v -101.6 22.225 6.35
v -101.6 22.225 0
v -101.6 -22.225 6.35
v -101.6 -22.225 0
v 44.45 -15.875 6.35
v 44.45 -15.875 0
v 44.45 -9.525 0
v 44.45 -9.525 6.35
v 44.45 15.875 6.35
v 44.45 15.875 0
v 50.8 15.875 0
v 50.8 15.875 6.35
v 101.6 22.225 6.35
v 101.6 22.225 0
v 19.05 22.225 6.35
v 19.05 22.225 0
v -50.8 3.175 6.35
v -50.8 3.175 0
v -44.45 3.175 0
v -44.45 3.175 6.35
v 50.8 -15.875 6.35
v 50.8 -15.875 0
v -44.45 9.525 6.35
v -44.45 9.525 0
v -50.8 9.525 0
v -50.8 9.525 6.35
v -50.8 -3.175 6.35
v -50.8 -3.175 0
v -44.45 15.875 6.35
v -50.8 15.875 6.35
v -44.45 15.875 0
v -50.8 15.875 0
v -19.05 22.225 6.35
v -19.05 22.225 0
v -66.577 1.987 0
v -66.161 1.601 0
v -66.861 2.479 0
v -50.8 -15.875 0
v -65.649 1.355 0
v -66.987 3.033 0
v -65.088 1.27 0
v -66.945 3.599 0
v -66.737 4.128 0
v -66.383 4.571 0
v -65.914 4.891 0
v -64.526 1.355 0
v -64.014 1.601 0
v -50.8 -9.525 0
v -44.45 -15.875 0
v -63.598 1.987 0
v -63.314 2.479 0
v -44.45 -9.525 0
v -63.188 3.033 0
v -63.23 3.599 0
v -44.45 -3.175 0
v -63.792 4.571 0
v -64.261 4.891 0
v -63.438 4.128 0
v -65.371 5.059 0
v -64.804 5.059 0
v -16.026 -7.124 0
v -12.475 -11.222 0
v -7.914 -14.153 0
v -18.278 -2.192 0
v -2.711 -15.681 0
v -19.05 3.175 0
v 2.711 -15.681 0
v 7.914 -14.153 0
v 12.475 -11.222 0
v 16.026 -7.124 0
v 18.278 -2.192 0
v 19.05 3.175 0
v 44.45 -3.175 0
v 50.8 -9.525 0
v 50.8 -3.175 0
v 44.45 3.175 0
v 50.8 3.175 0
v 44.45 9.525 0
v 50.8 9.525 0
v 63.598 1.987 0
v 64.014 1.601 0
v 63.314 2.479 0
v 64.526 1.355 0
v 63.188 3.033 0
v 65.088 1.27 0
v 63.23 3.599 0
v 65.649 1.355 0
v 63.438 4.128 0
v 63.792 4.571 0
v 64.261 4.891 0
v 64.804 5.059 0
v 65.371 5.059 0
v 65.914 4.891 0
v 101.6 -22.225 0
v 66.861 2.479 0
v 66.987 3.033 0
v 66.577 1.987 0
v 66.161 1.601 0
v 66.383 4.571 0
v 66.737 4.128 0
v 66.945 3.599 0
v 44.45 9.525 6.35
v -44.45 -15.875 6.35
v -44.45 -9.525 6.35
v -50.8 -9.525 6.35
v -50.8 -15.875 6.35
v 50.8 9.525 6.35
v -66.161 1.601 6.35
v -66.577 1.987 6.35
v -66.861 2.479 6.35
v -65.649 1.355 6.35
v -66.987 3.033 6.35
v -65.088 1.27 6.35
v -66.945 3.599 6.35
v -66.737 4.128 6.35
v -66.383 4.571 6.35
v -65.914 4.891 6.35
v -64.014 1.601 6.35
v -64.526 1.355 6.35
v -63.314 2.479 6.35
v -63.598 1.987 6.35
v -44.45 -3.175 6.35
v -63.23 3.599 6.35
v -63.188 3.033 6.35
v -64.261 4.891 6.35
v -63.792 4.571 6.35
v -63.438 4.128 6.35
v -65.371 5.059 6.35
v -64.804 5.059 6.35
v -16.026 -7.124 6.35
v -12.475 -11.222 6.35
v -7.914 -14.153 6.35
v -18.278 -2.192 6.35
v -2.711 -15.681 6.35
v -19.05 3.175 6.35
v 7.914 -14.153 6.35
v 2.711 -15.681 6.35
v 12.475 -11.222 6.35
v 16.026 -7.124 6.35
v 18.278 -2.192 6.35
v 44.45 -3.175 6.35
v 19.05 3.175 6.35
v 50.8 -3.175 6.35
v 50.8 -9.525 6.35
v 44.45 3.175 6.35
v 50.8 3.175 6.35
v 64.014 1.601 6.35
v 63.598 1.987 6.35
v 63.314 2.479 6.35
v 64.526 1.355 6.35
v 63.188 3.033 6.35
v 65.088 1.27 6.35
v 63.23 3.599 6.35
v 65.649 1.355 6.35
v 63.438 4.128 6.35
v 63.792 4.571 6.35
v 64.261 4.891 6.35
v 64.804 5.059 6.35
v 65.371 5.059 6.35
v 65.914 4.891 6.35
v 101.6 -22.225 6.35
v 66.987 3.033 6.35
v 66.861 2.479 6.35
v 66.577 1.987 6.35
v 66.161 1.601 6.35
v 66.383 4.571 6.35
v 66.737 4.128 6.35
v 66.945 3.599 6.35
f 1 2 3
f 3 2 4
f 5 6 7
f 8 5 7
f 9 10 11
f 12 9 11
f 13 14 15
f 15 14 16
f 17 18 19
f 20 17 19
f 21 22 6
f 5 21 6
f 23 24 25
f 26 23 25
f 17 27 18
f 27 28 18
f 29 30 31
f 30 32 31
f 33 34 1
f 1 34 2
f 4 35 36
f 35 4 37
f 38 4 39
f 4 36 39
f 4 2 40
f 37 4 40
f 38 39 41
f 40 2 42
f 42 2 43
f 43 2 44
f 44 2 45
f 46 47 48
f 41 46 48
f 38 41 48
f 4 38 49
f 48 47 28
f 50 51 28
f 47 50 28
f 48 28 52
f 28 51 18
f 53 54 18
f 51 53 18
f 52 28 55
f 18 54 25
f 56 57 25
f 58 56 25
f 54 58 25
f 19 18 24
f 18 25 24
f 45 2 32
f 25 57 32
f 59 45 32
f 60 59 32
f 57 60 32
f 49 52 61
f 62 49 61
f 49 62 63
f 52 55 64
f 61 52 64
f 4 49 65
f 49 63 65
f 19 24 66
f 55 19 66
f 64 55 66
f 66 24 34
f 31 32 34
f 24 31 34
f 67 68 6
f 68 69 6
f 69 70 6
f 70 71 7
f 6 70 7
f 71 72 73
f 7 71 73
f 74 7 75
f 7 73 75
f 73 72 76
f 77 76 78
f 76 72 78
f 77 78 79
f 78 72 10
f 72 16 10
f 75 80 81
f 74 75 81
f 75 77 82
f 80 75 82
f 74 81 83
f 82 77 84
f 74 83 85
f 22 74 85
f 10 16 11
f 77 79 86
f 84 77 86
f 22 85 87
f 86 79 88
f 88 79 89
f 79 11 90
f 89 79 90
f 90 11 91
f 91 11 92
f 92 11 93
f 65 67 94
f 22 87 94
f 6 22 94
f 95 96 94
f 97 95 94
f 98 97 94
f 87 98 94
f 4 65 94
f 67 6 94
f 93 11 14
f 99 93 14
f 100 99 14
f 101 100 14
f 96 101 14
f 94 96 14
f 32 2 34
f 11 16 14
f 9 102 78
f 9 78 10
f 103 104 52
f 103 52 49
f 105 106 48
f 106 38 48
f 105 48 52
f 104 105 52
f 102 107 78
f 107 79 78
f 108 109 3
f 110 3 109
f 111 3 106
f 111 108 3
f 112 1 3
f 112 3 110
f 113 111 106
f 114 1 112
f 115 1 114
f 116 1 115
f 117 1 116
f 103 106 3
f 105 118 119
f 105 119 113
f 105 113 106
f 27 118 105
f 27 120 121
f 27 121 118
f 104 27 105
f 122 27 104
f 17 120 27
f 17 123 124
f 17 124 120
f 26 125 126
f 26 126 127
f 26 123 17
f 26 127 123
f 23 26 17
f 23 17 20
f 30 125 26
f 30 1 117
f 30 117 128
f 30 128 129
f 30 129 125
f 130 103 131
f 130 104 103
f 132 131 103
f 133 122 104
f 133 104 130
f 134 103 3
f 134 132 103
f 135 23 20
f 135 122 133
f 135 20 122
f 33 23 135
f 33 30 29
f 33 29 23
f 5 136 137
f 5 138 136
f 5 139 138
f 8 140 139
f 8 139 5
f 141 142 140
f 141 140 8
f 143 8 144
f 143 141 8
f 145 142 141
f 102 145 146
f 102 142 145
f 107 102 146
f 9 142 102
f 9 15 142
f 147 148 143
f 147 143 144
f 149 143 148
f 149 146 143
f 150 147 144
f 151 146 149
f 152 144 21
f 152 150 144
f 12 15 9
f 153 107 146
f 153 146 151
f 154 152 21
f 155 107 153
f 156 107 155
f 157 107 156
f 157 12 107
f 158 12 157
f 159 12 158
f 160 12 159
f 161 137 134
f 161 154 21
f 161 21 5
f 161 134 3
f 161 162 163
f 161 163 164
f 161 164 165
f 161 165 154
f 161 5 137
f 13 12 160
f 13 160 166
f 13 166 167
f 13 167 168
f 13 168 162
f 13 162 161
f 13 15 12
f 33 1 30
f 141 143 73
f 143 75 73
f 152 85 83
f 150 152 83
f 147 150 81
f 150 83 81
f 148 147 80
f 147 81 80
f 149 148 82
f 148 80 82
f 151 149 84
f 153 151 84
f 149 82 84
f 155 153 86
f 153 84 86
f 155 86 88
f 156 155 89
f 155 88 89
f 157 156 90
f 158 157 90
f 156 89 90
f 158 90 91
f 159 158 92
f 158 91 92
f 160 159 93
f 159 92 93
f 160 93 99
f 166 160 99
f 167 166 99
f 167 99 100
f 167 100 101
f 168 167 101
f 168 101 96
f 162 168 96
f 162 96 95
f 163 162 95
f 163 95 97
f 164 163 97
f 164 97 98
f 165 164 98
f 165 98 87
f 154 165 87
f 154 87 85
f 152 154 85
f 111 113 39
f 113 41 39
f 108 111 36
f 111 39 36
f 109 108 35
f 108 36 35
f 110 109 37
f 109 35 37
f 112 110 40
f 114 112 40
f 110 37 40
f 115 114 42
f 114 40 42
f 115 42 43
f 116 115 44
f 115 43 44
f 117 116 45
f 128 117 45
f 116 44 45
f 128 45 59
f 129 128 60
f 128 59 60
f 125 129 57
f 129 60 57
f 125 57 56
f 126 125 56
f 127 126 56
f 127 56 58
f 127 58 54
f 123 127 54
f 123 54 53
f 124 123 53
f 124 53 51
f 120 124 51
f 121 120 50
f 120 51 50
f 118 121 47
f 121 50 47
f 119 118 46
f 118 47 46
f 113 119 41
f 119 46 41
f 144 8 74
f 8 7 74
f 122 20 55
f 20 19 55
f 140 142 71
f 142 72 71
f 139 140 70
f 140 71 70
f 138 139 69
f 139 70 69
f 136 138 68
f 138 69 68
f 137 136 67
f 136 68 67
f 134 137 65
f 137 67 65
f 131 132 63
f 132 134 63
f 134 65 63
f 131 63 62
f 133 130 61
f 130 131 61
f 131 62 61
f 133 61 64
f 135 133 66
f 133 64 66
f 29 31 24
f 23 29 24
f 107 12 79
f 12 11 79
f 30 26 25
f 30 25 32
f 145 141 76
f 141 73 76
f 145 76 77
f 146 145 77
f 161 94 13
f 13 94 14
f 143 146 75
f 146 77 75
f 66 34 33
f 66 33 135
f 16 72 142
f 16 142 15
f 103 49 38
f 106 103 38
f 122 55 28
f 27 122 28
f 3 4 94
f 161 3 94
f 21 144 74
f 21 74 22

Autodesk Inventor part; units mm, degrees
ref_plane "YZ Plane" through (0, 0, 0) normal (1, 0, 0) x (0, 1, 0)
ref_plane "XZ Plane" through (0, 0, 0) normal (0, 1, 0) x (-1, 0, 0)
ref_plane "XY Plane" through (0, 0, 0) normal (0, 0, 1) x (1, 0, 0)
sketch "Sketch1" plane through (0, 0, 0) normal (0, 0, 1) x (1, 0, 0)
  line L0 (-101.6, -22.225) -> (101.6, -22.225)
  line L1 (101.6, -22.225) -> (101.6, 22.225)
  line L2 (101.6, 22.225) -> (-101.6, 22.225)
  line L3 (-101.6, 22.225) -> (-101.6, -22.225)
  line L4 (-19.05, 22.225) -> (-19.05, 3.175)
  arc A0 (-19.05, 3.175) -> (19.05, 3.175) centre (0, 3.175) ccw
  line L5 (19.05, 3.175) -> (19.05, 22.225)
  line L6 (-50.8, 15.875) -> (-44.45, 15.875)
  line L7 (-44.45, 15.875) -> (-44.45, 9.525)
  line L8 (-44.45, 9.525) -> (-50.8, 9.525)
  line L9 (-50.8, 9.525) -> (-50.8, 15.875)
  line L10 (44.45, 15.875) -> (50.8, 15.875)
  line L11 (50.8, 15.875) -> (50.8, 9.525)
  line L12 (50.8, 9.525) -> (44.45, 9.525)
  line L13 (44.45, 9.525) -> (44.45, 15.875)
  line L14 (-50.8, 3.175) -> (-44.45, 3.175)
  line L15 (-44.45, 3.175) -> (-44.45, -3.175)
  line L16 (-44.45, -3.175) -> (-50.8, -3.175)
  line L17 (-50.8, -3.175) -> (-50.8, 3.175)
  line L18 (44.45, 3.175) -> (50.8, 3.175)
  line L19 (50.8, 3.175) -> (50.8, -3.175)
  line L20 (50.8, -3.175) -> (44.45, -3.175)
  line L21 (44.45, -3.175) -> (44.45, 3.175)
  line L22 (-50.8, -9.525) -> (-44.45, -9.525)
  line L23 (-44.45, -9.525) -> (-44.45, -15.875)
  line L24 (-44.45, -15.875) -> (-50.8, -15.875)
  line L25 (-50.8, -15.875) -> (-50.8, -9.525)
  line L26 (44.45, -9.525) -> (50.8, -9.525)
  line L27 (50.8, -9.525) -> (50.8, -15.875)
  line L28 (50.8, -15.875) -> (44.45, -15.875)
  line L29 (44.45, -15.875) -> (44.45, -9.525)
  point P0 (0, 0)
  point P1 (-101.6, 0)
  point P2 (0, 22.225)
  dimension "d0" = 203.2
  dimension "d1" = 44.45
  dimension "d2" = 6.35
  dimension "d3" = 44.45
  dimension "d4" = 6.35
  dimension "d7" = 95.25
  dimension "d10" = 12.7
  dimension "d13" = 19.05
  dimension "d14" = 19.05
extrude "Extrusion1" add sketch "Sketch1" along normal blind 6.35 contours L3 L2 L4 A0 L5 L1 L0
sketch "Sketch2" plane through (0, 0, 6.35) normal (0, 0, 1) x (1, 0, 0)
  line L0 (101.6, -22.225) -> (-101.6, -22.225) projected
  point P0 (0, 0)
  point P1 (-65.0875, 3.175)
  point P2 (65.0875, 3.175)
  dimension "d18" = 65.0875
  dimension "d26" = 130.175
  dimension "d27" = 25.4
hole "Hole1" at (-65.0875, 3.175, 6.35) at (65.0875, 3.175, 6.35) direction (0, 0, -1) diameter 3.81 end through all clearance for "Flat Head Machine Screw (82)" size "#6" standard "Ansi Unified Screw Threads"
equation "\"d18\" = 0.5 * d26"
properties part number "acrylic kinect bracket - kinect plate"
